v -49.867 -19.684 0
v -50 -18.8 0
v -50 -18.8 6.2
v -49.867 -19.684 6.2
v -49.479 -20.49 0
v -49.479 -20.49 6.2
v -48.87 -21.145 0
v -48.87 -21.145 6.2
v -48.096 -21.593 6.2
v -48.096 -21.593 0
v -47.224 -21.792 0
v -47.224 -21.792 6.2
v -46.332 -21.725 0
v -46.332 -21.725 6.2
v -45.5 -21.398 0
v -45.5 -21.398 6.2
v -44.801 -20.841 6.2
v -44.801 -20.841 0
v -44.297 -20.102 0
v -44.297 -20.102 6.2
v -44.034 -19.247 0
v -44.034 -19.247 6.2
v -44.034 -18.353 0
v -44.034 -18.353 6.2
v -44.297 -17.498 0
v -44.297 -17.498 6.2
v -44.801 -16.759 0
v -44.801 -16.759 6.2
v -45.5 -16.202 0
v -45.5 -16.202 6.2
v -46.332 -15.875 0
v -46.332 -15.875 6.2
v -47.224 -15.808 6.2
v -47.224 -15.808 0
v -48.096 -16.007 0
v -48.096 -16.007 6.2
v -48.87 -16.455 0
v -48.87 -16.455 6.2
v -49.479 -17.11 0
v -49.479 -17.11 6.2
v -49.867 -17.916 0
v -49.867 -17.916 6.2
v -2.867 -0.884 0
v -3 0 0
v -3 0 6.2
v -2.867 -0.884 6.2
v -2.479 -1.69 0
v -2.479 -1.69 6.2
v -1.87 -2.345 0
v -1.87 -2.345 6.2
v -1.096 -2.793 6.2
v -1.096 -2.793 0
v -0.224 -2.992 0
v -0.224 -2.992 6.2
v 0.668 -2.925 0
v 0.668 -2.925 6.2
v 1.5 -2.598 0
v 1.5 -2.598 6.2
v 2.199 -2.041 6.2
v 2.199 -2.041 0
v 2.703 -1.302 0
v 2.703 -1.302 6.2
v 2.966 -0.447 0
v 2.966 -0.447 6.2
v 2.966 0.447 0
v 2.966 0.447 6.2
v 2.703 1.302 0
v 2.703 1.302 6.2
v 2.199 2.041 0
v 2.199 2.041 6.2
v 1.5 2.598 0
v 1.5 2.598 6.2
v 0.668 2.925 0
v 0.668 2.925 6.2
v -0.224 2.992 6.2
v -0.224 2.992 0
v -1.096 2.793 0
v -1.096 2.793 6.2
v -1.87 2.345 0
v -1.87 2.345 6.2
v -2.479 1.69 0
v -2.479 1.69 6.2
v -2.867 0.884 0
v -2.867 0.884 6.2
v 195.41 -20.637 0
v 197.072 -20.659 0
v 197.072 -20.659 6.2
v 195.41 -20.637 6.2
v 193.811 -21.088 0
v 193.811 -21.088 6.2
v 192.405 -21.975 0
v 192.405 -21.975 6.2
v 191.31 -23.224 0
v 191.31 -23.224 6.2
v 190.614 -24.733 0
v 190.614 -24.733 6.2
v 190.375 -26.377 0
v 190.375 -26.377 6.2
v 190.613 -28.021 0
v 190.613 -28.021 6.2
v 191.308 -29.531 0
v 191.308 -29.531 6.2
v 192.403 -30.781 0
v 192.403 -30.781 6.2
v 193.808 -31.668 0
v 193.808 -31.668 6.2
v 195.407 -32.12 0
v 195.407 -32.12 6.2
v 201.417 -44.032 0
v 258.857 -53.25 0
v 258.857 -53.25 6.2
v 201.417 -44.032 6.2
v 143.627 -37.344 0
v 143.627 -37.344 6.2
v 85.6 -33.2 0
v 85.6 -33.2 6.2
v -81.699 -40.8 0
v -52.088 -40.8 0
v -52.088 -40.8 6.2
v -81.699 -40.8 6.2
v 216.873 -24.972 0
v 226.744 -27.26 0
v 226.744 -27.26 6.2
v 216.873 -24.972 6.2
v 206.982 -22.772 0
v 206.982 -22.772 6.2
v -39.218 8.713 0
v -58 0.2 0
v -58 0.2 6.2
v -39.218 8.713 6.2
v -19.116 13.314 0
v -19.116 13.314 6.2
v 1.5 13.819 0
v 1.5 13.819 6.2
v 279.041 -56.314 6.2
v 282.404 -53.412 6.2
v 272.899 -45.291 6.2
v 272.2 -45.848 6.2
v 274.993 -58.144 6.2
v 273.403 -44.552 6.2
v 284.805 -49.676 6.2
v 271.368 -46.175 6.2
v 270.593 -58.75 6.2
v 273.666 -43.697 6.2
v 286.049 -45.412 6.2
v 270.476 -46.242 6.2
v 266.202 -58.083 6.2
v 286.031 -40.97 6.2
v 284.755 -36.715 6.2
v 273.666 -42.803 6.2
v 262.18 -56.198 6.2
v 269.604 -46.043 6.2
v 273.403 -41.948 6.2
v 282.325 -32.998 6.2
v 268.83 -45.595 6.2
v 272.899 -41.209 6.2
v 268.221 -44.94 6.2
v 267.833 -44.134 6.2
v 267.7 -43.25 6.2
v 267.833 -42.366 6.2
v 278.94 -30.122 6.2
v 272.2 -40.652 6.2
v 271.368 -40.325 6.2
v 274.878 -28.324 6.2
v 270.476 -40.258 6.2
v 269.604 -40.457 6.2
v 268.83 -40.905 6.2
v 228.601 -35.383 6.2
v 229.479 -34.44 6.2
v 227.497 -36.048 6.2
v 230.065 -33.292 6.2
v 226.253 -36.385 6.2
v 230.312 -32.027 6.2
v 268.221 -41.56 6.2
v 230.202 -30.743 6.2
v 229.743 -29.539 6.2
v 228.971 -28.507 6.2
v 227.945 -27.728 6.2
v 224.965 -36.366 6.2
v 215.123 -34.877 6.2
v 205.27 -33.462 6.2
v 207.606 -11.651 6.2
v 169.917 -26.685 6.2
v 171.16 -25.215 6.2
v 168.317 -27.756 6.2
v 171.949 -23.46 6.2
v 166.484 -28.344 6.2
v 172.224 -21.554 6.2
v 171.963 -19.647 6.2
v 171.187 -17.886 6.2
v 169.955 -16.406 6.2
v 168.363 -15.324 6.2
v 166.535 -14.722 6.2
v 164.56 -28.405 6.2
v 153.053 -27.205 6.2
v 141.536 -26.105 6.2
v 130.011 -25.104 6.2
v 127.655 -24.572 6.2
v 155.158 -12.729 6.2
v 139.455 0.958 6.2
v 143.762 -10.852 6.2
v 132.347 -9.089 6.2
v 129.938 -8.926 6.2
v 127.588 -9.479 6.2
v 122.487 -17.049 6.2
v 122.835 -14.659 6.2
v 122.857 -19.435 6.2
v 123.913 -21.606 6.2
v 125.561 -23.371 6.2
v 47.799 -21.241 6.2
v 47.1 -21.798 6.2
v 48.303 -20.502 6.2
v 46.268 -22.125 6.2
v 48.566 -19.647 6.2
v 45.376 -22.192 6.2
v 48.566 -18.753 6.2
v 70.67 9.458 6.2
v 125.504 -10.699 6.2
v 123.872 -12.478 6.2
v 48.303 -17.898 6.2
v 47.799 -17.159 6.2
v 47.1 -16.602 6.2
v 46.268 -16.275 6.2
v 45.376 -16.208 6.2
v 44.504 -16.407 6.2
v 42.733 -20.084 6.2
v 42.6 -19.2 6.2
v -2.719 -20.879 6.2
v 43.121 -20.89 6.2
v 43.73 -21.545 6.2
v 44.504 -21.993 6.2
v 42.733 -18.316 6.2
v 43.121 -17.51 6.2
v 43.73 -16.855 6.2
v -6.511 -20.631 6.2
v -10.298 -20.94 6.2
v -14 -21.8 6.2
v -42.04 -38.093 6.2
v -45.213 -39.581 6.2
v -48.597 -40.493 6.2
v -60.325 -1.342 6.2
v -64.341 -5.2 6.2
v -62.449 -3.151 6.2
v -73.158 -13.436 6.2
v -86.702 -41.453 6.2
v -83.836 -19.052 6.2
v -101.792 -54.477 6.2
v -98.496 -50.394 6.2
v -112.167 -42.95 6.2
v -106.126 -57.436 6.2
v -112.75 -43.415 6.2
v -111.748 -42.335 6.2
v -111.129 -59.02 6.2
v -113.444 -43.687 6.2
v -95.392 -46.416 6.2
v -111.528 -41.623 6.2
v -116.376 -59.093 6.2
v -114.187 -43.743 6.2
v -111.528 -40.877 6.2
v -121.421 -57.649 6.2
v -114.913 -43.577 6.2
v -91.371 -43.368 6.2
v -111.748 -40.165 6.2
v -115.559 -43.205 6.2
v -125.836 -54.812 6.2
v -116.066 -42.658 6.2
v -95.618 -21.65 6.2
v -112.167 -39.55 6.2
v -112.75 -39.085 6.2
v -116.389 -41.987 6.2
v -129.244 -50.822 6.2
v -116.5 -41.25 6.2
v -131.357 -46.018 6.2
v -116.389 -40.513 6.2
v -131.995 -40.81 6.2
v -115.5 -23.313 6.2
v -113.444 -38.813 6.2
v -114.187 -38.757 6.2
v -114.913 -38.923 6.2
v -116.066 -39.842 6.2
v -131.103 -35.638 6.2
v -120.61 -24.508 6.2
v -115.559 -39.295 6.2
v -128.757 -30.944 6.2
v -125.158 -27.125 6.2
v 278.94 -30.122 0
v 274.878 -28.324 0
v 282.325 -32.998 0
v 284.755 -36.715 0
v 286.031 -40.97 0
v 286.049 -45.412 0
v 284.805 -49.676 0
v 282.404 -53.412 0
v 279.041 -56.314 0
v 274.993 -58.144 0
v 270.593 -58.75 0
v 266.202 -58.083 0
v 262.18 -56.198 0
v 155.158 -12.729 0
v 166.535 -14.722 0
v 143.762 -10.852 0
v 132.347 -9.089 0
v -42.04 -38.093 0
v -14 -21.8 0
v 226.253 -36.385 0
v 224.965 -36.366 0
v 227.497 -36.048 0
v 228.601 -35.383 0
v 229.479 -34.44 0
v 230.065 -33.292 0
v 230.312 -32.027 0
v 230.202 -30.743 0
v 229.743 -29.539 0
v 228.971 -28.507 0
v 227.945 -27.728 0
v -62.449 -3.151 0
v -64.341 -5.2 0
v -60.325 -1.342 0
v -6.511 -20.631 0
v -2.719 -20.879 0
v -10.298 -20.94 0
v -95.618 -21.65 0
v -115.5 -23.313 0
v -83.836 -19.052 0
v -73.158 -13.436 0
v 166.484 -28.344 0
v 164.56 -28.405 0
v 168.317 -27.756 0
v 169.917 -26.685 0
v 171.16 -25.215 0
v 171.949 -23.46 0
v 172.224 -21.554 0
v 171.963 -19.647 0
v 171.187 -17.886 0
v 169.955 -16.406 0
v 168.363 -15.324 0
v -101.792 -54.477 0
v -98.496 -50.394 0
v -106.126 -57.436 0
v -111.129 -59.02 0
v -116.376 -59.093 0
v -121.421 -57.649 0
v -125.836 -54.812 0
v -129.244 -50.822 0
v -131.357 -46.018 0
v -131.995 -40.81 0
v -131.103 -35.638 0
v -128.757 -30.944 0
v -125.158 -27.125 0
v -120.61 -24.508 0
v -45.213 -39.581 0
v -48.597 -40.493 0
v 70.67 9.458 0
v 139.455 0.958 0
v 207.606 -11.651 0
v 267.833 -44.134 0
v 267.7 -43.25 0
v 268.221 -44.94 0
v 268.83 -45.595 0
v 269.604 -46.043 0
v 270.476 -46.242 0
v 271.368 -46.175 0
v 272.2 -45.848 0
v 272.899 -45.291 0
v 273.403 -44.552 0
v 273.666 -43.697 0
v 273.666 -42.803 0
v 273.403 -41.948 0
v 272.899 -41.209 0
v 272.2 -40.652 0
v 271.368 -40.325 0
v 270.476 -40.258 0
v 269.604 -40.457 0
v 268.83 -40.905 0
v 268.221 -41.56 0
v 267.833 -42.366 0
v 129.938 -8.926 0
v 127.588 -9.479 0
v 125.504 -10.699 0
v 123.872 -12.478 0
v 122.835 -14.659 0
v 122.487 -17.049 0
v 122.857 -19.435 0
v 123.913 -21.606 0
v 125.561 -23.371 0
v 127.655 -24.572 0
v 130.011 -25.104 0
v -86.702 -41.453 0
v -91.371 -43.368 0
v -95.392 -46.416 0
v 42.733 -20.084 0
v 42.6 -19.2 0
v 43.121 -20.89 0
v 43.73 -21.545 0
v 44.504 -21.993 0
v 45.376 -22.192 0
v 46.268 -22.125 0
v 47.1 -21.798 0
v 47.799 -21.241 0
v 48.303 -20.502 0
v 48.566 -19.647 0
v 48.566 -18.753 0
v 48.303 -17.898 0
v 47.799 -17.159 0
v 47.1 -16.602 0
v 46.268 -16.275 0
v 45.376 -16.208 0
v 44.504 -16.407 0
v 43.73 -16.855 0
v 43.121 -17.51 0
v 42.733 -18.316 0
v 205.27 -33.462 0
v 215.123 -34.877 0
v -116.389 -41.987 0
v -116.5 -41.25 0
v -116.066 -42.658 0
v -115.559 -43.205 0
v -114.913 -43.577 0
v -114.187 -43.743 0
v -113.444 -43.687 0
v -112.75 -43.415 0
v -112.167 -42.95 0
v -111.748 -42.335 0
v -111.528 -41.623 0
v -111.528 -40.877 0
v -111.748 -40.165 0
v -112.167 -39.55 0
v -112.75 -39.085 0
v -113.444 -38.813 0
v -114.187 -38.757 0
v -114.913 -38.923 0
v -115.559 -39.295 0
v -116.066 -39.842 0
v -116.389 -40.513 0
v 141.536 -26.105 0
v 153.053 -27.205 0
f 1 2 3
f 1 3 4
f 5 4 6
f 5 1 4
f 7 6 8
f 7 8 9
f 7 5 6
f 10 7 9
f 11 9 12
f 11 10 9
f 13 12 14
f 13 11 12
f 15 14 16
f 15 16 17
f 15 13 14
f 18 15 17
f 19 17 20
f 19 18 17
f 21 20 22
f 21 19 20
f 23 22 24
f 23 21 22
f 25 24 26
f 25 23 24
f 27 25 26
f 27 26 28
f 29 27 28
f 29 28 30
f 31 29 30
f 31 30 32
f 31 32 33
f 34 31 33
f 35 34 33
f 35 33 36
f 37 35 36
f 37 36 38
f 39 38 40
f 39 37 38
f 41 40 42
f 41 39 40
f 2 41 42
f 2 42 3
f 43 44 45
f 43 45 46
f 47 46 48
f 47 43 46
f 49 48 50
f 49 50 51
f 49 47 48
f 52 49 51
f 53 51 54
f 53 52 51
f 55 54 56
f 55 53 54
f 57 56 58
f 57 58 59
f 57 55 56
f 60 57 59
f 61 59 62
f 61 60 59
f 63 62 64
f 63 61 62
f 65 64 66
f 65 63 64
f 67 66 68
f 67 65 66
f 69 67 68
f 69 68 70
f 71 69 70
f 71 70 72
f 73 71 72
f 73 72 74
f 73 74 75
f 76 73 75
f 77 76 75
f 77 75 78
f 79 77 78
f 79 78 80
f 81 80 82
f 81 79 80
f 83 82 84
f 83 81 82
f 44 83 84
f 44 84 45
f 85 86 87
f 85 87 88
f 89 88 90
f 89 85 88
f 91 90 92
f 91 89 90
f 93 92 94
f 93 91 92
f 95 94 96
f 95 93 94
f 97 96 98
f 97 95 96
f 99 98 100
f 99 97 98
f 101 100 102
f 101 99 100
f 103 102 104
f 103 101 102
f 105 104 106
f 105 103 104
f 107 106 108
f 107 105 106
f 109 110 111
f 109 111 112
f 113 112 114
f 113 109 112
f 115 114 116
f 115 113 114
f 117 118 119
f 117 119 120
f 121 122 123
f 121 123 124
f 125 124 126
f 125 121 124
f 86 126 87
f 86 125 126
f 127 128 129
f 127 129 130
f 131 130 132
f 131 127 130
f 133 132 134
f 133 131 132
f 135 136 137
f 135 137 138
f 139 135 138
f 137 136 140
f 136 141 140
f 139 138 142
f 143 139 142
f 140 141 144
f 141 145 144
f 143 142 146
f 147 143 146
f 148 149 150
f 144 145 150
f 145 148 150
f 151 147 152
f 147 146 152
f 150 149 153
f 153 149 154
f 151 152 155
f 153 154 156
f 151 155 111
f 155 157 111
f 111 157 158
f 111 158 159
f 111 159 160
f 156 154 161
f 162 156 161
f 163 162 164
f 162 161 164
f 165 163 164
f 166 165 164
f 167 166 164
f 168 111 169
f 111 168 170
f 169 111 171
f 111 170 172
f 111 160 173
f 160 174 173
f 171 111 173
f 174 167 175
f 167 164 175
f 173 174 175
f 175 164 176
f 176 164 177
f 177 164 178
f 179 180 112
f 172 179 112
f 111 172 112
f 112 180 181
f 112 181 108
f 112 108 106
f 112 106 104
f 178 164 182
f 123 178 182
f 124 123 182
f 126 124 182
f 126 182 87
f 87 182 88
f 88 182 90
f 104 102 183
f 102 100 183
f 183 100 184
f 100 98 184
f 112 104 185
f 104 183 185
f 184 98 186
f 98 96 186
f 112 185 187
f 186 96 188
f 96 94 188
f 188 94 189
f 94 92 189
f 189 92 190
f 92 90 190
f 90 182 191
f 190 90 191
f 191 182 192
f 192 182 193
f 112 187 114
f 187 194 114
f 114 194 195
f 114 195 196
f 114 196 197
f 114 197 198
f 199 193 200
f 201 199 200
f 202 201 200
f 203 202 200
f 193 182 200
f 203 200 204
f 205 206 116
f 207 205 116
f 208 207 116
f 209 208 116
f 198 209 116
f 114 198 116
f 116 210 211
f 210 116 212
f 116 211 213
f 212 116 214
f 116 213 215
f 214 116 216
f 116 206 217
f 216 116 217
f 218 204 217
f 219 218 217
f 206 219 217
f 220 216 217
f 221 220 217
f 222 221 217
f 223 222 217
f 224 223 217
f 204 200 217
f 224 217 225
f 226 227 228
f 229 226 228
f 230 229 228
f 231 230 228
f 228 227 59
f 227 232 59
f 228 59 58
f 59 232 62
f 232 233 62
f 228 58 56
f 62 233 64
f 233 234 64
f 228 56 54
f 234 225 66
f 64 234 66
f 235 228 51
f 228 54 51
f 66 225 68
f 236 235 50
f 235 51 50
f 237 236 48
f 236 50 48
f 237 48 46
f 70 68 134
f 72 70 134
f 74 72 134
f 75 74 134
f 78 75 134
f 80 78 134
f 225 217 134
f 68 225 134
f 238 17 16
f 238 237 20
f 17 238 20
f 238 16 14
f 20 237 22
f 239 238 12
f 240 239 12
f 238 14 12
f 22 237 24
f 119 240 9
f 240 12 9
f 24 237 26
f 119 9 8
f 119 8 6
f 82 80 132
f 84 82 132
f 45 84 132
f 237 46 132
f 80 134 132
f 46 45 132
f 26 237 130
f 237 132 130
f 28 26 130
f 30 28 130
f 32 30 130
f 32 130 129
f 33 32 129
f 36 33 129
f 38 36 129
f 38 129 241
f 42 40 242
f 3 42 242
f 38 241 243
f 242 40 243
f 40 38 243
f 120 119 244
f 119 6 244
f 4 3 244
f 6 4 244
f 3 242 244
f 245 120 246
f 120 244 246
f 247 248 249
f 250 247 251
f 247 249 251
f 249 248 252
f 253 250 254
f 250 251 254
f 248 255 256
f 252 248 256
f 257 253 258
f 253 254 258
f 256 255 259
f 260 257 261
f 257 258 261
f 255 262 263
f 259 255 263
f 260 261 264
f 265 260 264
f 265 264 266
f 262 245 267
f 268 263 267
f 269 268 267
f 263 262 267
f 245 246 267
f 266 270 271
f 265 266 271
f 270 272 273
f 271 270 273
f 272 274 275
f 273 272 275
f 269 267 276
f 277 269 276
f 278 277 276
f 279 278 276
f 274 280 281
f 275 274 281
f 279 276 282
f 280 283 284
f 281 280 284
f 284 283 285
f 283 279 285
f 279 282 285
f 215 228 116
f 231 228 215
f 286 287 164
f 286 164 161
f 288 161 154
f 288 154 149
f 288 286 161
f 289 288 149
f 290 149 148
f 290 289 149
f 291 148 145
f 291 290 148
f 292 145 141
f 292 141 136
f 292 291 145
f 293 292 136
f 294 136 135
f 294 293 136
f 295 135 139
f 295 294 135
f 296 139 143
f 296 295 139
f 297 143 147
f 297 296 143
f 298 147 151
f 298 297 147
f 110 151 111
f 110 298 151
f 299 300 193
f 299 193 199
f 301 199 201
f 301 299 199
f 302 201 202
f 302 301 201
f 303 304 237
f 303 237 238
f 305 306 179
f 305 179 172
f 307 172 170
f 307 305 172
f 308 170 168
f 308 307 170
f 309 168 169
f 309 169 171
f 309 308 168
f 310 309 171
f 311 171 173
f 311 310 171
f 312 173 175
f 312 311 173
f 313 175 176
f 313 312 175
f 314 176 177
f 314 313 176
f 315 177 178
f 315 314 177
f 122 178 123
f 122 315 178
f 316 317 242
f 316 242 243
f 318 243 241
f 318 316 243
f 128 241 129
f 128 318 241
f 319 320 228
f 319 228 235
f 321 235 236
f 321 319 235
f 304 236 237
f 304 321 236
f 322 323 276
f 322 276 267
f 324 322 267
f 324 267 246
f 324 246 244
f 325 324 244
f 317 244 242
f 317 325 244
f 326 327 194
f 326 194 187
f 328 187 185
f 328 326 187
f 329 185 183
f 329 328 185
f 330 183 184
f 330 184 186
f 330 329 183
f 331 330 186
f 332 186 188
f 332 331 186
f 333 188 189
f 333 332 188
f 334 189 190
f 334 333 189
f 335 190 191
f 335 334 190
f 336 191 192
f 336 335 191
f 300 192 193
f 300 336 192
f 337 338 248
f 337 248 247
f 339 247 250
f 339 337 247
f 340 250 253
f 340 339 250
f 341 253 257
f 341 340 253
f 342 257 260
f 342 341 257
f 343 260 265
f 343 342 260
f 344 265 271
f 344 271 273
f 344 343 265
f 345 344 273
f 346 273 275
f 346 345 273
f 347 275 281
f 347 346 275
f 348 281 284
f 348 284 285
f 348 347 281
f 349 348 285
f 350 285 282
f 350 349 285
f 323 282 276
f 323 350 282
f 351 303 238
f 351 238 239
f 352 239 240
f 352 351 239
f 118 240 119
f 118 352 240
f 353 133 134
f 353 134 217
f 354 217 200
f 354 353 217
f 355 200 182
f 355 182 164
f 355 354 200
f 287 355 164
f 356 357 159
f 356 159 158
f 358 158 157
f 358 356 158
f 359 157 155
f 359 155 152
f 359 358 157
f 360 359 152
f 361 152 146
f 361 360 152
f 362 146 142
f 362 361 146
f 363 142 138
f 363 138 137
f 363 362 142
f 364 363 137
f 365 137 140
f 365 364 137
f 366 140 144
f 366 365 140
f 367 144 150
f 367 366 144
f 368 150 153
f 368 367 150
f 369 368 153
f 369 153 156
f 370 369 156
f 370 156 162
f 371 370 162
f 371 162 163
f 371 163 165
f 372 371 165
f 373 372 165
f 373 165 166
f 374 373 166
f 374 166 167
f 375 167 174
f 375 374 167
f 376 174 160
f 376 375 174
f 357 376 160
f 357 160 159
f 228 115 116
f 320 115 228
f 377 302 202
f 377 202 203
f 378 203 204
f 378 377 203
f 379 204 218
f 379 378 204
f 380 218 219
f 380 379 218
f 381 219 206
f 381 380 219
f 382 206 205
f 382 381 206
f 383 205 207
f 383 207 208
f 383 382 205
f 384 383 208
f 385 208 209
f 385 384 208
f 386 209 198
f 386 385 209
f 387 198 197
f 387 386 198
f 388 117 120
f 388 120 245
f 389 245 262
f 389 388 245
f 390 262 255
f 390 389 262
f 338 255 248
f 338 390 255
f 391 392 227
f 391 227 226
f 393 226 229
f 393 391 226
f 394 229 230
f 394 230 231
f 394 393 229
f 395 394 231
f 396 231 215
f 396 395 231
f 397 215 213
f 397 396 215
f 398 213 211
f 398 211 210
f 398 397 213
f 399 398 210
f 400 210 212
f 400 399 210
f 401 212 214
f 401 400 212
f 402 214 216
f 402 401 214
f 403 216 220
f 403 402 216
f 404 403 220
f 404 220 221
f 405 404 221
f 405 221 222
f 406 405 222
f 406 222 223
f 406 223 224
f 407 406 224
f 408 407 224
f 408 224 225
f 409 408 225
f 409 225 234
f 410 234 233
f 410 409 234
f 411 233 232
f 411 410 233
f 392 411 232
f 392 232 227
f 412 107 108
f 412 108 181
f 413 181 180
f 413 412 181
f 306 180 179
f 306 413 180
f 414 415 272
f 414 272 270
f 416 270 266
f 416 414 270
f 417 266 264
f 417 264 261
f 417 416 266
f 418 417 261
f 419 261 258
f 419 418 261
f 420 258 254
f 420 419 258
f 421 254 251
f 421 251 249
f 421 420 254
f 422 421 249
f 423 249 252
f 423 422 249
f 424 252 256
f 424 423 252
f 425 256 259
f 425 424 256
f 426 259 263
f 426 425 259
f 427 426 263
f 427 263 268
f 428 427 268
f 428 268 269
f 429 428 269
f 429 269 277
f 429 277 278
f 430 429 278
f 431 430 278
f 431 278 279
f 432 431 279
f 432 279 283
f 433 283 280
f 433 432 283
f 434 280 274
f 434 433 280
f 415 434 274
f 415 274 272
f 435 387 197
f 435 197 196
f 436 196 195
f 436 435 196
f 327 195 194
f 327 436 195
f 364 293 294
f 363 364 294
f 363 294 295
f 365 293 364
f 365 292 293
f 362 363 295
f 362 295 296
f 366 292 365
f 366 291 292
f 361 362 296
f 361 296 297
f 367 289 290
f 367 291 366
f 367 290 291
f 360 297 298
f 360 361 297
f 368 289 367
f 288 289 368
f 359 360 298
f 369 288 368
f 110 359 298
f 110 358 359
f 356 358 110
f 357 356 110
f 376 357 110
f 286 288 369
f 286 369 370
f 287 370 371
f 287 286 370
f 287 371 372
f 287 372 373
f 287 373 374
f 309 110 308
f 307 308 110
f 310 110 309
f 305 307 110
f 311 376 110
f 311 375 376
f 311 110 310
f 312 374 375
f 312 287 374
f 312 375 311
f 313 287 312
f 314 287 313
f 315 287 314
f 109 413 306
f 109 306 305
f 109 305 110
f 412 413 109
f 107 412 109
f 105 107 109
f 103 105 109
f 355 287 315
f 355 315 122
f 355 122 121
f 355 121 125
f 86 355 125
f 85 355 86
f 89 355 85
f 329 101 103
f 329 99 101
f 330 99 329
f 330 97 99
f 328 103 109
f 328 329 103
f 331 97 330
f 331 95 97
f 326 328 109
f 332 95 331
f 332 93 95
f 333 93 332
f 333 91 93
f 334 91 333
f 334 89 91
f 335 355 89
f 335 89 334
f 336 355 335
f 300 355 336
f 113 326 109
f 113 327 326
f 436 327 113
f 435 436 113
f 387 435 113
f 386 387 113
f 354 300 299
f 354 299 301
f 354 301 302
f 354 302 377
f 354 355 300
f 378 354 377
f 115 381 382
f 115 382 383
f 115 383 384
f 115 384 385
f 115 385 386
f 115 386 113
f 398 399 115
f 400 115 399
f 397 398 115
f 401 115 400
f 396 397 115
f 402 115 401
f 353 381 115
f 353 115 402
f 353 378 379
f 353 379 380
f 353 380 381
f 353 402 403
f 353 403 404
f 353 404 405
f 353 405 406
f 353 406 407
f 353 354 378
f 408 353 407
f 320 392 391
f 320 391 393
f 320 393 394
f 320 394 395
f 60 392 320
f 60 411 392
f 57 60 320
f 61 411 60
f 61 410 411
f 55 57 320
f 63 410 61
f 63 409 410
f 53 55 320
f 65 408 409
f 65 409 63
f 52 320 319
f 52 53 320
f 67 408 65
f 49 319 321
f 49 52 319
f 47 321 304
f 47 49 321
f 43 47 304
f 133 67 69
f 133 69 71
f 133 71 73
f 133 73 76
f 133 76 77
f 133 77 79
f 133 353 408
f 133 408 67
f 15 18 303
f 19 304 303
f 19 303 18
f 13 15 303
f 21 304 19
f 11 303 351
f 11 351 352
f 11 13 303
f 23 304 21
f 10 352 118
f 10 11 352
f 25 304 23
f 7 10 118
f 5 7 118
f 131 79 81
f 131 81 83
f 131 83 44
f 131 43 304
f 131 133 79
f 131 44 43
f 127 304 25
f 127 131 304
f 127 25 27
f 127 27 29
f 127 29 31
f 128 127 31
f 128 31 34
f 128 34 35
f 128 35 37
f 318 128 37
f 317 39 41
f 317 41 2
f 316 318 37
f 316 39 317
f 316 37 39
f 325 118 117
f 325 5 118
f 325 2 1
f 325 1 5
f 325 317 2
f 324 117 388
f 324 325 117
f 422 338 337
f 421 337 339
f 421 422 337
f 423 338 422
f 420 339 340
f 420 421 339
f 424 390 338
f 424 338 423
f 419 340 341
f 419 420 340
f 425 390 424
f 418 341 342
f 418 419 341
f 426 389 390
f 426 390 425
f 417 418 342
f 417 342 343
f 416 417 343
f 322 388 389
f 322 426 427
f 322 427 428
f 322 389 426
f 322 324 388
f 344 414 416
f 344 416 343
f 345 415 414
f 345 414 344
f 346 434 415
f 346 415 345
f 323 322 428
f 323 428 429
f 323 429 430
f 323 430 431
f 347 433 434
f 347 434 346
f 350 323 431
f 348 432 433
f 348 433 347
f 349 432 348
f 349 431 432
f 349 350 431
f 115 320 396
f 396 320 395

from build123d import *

# Parameters (mm, degrees)
SKETCH1_R           = 2.5
SKETCH1_R_2         = 3
BOSS_EXTRUDE1_DEPTH = 6.2


with BuildPart() as part:
    # Sketch1 → Boss-Extrude1 (new body)
    with BuildSketch(Plane.XY):
        with BuildLine():
            Line((85.6, -33.2), (-2.718519223, -20.878508118))
            ThreePointArc((-2.718519223, -20.878508118), (-8.41017463, -20.715920511), (-14, -21.8))
            Line((-14, -21.8), (-42.039824529, -38.092696265))
            ThreePointArc((-42.039824529, -38.092696265), (-46.884666341, -40.111316958), (-52.087842039, -40.8))
            Line((-52.087842039, -40.8), (-81.699109919, -40.8))
            ThreePointArc((-81.699109919, -40.8), (-91.370795398, -43.36753119), (-98.495572761, -50.394))
            ThreePointArc((-98.495572761, -50.394), (-129.24406218, -50.82175889), (-115.5, -23.312608885))
            Line((-115.5, -23.312608885), (-95.618089435, -21.65))
            ThreePointArc((-95.618089435, -21.65), (-78.309182519, -16.601252711), (-64.341378668, -5.2))
            ThreePointArc((-64.341378668, -5.2), (-61.413749232, -2.21456762), (-58, 0.2))
            ThreePointArc((-58, 0.2), (-29.282001226, 11.518177334), (1.5, 13.818827736))
            ThreePointArc((1.5, 13.818827736), (139.454874424, 0.958251967), (274.87829908, -28.323787594))
            ThreePointArc((274.87829908, -28.323787594), (283.738974288, -51.630641354), (258.857280718, -53.25))
            ThreePointArc((258.857280718, -53.25), (172.558903288, -40.371111866), (85.6, -33.2))
        make_face()
        with Locations(Location((-114, -41.25, 0), (0, 0, 180))):
            Circle(SKETCH1_R, mode=Mode.SUBTRACT)
        with Locations(Location((-47, -18.8, 0), (0, 0, 180))):
            Circle(SKETCH1_R_2, mode=Mode.SUBTRACT)
        with Locations(Location((45.6, -19.2, 0), (0, 0, 180))):
            Circle(SKETCH1_R_2, mode=Mode.SUBTRACT)
        with Locations(Location((0, 0, 0), (0, 0, 180))):
            Circle(SKETCH1_R_2, mode=Mode.SUBTRACT)
        with Locations(Location((270.7, -43.25, 0), (0, 0, 180))):
            Circle(SKETCH1_R_2, mode=Mode.SUBTRACT)
        with BuildLine():
            ThreePointArc((226.744224082, -27.259797753), (211.929816899, -23.860779344), (197.071572094, -20.658819377))
            ThreePointArc((197.071572094, -20.658819377), (190.434794526, -25.546132018), (195.40651845, -32.119913468))
            ThreePointArc((195.40651845, -32.119913468), (210.197393834, -34.160215491), (224.964543777, -36.365688118))
            ThreePointArc((224.964543777, -36.365688118), (230.232403999, -32.668395241), (226.744224082, -27.259797753))
        make_face(mode=Mode.SUBTRACT)
        with BuildLine():
            ThreePointArc((132.347185699, -9.089339403), (122.571709195, -15.840894216), (130.010518711, -25.104130489))
            ThreePointArc((130.010518711, -25.104130489), (147.296090717, -26.642266435), (164.560225388, -28.404797523))
            ThreePointArc((164.560225388, -28.404797523), (172.152990765, -22.51669502), (166.534944909, -14.721991823))
            ThreePointArc((166.534944909, -14.721991823), (149.462384392, -11.776267989), (132.347185699, -9.089339403))
        make_face(mode=Mode.SUBTRACT)
    extrude(amount=BOSS_EXTRUDE1_DEPTH)


solid = part.part
